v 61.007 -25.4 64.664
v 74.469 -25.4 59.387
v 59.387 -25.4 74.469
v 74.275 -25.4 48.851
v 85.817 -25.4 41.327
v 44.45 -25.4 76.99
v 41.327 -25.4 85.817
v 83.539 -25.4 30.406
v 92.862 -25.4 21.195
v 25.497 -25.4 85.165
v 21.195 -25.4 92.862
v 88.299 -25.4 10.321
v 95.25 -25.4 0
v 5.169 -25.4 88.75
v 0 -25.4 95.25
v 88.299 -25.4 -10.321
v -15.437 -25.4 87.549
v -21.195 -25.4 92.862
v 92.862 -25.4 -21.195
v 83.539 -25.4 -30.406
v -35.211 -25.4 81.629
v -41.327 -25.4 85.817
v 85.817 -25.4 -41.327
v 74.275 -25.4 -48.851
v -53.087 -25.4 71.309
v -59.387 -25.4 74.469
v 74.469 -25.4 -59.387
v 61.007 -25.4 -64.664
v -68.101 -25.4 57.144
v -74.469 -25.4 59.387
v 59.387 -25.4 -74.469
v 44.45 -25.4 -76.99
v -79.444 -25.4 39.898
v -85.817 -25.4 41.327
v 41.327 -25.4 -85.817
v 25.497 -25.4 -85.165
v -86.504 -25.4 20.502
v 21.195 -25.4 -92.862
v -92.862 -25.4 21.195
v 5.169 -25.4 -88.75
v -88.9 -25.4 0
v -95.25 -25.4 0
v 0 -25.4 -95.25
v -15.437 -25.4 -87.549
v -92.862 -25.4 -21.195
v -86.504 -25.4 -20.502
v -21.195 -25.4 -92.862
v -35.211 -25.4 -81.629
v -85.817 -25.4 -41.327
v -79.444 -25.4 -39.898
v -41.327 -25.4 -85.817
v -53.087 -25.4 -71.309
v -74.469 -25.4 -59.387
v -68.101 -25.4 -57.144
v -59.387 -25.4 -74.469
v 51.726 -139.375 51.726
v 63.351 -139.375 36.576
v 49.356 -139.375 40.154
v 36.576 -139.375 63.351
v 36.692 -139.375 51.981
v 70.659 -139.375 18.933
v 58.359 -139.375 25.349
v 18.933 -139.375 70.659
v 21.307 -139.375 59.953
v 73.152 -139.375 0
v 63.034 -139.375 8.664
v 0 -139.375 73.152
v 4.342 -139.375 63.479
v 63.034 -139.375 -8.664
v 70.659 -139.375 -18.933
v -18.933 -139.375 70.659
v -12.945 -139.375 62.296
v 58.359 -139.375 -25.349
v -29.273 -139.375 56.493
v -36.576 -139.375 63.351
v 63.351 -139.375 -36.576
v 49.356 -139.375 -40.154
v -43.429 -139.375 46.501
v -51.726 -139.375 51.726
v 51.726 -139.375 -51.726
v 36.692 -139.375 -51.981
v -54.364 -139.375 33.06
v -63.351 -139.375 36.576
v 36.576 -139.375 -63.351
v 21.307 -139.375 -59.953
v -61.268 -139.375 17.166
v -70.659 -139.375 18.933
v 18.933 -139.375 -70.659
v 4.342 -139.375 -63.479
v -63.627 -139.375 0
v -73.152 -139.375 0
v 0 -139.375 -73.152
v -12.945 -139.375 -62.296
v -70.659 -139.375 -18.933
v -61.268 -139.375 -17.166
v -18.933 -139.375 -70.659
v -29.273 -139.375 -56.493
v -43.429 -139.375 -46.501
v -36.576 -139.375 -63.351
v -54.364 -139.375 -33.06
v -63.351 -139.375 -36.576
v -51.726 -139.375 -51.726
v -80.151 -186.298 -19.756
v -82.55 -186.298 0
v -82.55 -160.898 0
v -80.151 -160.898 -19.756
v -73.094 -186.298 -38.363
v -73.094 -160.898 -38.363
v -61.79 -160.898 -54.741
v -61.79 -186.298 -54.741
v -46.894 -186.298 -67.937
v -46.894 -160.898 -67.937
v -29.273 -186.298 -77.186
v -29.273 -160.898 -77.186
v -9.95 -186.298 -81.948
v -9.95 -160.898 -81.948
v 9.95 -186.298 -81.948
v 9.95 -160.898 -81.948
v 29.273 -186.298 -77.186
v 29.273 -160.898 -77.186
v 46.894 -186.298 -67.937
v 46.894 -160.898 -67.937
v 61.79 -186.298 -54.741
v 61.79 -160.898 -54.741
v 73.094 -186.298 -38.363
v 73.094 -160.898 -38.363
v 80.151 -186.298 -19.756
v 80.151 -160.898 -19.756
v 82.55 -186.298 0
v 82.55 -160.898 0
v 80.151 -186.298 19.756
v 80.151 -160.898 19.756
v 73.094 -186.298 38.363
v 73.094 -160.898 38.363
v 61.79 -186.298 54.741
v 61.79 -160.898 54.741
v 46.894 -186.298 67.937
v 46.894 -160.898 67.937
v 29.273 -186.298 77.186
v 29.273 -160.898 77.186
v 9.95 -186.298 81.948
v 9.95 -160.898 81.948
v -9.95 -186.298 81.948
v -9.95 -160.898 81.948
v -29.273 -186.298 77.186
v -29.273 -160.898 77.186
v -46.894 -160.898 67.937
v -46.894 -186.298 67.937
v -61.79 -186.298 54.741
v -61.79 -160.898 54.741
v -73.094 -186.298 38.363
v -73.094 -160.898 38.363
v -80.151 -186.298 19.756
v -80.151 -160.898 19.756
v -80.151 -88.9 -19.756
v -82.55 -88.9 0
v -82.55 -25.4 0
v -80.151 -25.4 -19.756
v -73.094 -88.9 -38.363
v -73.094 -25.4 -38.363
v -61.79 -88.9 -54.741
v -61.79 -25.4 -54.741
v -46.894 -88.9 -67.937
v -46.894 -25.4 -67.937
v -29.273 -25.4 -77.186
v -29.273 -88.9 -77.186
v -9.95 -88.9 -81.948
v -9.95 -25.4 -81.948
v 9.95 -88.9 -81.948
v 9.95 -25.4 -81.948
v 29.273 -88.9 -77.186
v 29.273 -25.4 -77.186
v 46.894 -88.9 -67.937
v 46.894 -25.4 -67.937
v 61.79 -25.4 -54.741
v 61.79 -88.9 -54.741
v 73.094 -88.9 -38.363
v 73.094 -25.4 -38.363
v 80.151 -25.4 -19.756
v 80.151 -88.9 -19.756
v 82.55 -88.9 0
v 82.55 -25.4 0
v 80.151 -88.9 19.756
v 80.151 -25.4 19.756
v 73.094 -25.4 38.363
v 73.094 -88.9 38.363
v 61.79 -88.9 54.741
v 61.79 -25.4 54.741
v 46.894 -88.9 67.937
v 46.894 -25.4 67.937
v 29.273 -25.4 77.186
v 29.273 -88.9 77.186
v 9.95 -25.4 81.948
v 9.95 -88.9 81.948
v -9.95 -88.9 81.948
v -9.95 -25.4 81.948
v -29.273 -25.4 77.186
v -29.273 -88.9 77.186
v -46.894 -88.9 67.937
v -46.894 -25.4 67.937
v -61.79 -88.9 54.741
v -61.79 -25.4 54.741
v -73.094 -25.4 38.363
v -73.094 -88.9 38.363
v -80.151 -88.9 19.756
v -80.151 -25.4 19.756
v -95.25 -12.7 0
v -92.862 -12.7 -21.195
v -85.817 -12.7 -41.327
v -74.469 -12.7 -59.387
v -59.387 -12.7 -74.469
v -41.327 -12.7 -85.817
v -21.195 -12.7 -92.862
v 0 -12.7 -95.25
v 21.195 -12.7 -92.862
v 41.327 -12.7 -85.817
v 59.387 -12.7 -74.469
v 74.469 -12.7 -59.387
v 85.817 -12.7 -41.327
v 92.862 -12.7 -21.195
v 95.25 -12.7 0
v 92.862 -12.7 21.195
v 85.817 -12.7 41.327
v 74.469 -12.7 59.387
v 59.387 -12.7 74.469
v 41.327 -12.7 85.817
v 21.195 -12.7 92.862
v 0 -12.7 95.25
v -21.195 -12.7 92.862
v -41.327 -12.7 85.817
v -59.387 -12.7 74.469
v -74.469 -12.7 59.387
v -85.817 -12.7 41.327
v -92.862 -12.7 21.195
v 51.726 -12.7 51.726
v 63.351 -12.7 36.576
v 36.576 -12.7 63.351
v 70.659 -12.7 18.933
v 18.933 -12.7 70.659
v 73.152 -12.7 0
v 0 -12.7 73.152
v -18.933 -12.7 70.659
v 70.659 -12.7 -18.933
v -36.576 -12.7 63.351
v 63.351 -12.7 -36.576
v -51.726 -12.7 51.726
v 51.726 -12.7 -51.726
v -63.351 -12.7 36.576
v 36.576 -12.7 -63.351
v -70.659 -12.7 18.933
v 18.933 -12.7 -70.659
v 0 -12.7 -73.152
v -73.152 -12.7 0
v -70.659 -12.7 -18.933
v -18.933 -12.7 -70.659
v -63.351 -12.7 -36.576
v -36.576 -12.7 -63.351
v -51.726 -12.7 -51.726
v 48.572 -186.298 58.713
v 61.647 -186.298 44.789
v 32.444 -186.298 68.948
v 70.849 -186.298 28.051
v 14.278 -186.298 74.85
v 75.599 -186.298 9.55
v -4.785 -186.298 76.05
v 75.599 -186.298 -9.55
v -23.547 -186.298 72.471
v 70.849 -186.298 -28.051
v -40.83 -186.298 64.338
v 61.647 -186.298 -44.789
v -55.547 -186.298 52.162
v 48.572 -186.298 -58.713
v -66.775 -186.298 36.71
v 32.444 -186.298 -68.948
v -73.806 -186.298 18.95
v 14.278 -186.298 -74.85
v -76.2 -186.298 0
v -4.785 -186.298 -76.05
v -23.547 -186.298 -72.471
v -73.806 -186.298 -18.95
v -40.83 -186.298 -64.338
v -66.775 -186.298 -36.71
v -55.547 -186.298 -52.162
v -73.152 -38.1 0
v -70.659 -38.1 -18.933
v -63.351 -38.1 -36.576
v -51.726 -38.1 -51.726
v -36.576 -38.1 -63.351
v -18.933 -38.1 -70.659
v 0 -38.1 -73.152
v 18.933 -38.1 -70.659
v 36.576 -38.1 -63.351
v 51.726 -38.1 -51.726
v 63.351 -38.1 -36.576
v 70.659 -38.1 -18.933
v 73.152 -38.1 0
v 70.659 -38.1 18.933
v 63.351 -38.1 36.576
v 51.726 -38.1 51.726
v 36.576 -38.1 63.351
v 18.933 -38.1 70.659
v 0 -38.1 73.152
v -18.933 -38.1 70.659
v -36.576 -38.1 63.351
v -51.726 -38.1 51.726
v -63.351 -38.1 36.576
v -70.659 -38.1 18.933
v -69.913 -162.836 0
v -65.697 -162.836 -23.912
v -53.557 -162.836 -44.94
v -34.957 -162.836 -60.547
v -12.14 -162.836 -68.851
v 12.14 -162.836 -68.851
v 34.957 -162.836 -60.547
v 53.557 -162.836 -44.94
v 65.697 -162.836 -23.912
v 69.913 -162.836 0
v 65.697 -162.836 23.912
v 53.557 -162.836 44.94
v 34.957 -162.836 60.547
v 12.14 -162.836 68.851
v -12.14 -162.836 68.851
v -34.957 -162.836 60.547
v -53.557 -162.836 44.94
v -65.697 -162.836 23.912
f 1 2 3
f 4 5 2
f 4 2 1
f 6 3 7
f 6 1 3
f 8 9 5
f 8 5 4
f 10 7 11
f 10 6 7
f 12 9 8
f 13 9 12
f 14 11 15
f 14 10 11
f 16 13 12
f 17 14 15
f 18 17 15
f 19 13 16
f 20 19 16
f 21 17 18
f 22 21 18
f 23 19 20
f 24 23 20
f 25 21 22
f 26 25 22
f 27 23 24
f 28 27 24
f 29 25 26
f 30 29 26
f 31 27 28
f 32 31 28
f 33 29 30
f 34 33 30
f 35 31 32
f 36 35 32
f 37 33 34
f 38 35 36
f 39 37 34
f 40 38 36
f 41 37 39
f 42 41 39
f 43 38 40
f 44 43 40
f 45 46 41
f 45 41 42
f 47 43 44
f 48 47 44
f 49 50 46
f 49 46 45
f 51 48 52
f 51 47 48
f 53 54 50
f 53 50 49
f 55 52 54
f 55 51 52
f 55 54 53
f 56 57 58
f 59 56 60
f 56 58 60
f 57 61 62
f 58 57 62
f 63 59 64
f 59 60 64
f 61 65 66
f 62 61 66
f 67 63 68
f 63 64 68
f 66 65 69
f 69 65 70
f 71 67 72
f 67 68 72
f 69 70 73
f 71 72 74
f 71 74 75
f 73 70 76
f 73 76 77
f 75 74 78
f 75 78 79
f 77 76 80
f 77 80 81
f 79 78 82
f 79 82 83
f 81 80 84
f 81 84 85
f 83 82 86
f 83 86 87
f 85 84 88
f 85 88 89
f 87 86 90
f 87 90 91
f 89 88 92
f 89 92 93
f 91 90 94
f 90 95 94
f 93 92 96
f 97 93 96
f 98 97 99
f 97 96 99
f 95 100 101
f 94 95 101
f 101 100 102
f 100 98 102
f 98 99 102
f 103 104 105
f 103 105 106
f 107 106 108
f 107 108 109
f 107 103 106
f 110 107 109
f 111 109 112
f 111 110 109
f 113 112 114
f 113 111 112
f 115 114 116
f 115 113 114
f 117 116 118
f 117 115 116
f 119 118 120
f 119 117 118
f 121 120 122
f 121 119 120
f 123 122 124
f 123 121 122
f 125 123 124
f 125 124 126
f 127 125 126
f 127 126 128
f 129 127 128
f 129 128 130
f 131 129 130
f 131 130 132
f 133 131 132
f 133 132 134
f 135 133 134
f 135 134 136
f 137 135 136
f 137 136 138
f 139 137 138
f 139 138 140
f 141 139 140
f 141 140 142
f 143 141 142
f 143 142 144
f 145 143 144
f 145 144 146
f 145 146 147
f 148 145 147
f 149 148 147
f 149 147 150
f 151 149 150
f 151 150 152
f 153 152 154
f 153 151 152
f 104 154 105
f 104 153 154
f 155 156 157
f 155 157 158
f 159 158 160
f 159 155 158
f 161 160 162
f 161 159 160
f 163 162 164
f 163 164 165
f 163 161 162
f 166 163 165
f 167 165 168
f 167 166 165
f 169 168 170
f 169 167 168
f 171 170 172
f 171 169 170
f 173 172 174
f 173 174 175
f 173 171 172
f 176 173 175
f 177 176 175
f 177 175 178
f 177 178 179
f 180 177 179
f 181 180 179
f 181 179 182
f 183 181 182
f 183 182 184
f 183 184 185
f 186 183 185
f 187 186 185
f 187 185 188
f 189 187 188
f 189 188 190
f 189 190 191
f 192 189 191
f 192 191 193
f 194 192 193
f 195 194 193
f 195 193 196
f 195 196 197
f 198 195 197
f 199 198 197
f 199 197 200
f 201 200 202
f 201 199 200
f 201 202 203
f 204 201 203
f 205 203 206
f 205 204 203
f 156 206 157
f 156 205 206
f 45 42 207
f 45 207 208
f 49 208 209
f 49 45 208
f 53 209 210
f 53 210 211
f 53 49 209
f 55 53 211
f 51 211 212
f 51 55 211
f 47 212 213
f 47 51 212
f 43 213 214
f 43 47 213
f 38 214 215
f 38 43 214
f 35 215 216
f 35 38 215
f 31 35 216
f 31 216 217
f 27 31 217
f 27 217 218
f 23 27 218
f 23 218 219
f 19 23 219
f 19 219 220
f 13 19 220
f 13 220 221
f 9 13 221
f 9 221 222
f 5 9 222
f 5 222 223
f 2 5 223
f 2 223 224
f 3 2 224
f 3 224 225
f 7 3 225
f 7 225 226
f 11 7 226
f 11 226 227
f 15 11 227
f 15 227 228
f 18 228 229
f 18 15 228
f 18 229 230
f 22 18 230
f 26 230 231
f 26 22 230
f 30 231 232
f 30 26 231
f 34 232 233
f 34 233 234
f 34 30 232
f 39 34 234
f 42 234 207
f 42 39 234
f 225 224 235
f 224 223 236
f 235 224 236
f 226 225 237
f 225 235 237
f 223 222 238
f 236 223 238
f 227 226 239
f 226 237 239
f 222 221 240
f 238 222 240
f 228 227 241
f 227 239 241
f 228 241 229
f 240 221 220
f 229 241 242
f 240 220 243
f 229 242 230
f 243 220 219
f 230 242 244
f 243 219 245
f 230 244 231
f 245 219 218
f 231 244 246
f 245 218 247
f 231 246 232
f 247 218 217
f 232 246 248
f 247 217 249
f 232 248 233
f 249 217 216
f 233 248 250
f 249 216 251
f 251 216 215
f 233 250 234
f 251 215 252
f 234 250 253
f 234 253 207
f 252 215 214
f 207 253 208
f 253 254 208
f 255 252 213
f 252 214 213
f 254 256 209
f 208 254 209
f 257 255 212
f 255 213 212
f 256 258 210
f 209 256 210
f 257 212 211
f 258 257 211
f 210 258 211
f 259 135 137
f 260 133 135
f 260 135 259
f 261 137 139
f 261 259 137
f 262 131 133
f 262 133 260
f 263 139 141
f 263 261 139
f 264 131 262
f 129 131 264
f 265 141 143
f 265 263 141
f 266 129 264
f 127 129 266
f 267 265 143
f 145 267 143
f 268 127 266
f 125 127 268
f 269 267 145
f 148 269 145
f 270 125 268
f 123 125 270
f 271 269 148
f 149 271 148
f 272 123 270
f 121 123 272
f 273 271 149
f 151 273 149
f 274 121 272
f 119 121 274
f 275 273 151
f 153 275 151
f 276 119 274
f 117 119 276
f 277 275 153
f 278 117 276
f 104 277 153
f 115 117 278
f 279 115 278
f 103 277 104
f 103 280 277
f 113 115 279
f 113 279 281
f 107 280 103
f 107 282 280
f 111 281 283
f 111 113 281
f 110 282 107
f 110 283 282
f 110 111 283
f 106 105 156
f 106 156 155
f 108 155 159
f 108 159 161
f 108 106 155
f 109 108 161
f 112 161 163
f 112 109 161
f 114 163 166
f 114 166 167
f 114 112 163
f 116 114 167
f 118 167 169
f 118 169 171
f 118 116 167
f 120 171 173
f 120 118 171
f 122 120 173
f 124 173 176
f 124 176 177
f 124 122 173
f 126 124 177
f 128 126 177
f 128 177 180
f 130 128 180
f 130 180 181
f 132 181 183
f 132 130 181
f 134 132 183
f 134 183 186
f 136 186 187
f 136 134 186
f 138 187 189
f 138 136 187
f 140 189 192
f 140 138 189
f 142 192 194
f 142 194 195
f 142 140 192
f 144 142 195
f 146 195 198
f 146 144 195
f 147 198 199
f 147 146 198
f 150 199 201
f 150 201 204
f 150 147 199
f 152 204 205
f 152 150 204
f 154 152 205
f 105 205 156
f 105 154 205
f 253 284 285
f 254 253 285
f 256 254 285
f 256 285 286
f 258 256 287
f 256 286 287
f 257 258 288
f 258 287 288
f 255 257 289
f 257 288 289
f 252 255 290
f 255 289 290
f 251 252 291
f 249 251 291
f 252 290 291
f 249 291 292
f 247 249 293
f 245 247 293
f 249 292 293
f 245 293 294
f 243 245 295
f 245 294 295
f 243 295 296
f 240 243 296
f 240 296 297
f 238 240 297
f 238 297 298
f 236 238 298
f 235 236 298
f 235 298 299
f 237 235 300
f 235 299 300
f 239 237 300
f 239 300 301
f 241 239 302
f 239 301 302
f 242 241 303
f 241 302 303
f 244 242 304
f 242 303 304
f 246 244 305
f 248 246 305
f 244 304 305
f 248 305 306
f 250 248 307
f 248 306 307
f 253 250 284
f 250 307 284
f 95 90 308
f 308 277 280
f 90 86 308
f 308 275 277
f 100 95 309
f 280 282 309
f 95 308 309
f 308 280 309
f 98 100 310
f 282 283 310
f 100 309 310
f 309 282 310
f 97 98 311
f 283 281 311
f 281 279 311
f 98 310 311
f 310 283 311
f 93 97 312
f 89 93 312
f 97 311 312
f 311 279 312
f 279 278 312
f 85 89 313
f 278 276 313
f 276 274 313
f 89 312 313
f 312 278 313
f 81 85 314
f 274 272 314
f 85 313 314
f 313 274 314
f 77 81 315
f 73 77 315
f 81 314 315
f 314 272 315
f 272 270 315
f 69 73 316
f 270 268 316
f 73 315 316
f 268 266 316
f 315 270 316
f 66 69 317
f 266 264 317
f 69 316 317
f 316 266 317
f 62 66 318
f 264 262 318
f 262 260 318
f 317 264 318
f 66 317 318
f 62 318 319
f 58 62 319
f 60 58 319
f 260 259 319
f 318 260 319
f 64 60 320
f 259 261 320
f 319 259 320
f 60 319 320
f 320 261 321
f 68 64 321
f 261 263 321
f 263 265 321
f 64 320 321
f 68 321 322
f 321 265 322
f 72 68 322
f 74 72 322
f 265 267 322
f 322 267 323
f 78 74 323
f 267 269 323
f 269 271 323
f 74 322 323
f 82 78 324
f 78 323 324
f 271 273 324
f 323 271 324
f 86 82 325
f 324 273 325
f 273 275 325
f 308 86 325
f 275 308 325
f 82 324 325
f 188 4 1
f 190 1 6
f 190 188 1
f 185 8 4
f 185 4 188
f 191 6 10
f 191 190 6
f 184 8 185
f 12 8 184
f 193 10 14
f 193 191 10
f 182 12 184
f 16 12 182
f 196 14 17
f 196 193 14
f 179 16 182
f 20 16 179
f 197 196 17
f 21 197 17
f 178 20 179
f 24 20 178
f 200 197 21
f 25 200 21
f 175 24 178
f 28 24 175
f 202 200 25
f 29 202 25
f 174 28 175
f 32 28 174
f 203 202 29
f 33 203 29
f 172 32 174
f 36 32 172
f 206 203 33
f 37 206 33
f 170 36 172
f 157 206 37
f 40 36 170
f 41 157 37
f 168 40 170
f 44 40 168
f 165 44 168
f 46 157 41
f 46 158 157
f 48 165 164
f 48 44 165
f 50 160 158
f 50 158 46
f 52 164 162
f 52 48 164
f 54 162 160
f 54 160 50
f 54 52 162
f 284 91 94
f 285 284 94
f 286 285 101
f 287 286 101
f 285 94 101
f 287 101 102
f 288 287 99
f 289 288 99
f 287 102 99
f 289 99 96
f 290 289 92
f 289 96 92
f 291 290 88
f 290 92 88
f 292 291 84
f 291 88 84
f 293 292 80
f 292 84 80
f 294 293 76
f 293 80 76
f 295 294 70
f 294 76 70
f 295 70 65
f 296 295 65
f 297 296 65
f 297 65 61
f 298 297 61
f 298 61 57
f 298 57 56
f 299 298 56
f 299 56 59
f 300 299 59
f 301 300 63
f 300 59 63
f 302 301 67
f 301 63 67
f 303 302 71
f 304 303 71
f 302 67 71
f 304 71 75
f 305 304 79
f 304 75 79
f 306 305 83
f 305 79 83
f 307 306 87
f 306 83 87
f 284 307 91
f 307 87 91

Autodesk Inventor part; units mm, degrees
ref_plane "YZ Plane" through (0, 0, 0) normal (1, 0, 0) x (0, 1, 0)
ref_plane "XZ Plane" through (0, 0, 0) normal (0, 1, 0) x (-1, 0, 0)
ref_plane "XY Plane" through (0, 0, 0) normal (0, 0, 1) x (1, 0, 0)
sketch "Sketch1" plane through (0, 0, 0) normal (0, 0, 1) x (1, 0, 0)
  line L0 (0, 25.4) -> (-28.702, 25.4) construction
  line L1 (0, 25.4) -> (-95.25, 25.4) construction
  line L2 (-95.25, 25.4) -> (-92.075, 25.4) construction
  line L3 (-92.075, 25.4) -> (-84.455, 21.8467) construction
  line L4 (-92.075, 25.4) -> (-92.075, 22.4389) construction
  line L5 (-92.075, 0) -> (-95.25, 0)
  line L6 (-28.702, 59.0535) -> (-28.702, -92.5226) construction
  arc A0 (-28.9184, -9.8402) -> (-32.3684, -2.4417) centre (-35.052, -8.1967) ccw
  line L7 (-76.2, -186.2977) -> (-28.702, -9.0327)
  line L8 (-92.075, 25.4) -> (-92.075, 0)
  line L9 (-92.075, 25.4) -> (-32.3684, -2.4417)
  line L10 (-28.702, -8.1967) -> (-60.452, -8.1967) construction
  line L11 (-60.452, -127.5253) -> (-54.102, -127.5253) construction
  line L12 (-54.102, -127.5253) -> (-54.102, -103.8268) construction
  line L13 (-54.102, -103.8268) -> (-60.452, -103.8268)
  line L14 (-60.452, 10.654) -> (-60.452, 1.129) construction
  line L15 (-60.452, 10.654) -> (-60.452, 4.1232) construction
  line L16 (-60.452, 4.1232) -> (-46.4468, 4.1232)
  line L17 (-95.25, 0) -> (-95.25, -12.7) construction
  line L18 (-60.452, -12.7) -> (-73.152, -12.7) construction
  line L19 (-95.25, -12.7) -> (-95.25, -25.4) construction
  line L20 (-95.25, -25.4) -> (-95.25, -88.9) construction
  line L21 (-95.25, -88.9) -> (-82.55, -88.9) construction
  line L22 (-82.55, -88.9) -> (-82.55, -25.4) construction
  line L23 (-95.25, -25.4) -> (-82.55, -25.4)
  line L24 (-82.55, -25.4) -> (-82.55, -88.9)
  line L25 (-82.55, -88.9) -> (-95.25, -88.9)
  line L26 (-95.25, -12.7) -> (-73.152, -12.7)
  line L27 (-73.152, -139.3746) -> (-63.627, -139.3746)
  line L28 (-82.55, -88.9) -> (-82.55, -186.2977)
  line L29 (-82.55, -186.2977) -> (-76.2, -186.2977)
  line L30 (-73.152, -12.7) -> (-73.152, -139.3746)
  line L31 (-88.9, -25.4) -> (-88.9, -31.3436)
  line L32 (-88.9, -31.3436) -> (-95.25, -31.3436)
  line L33 (-95.25, 0) -> (-95.25, -25.4)
  line L34 (-95.25, -31.3436) -> (-95.25, -88.9)
  line L35 (-88.9, -160.8977) -> (-88.9, -221.8454)
  line L36 (-28.9184, -9.8402) -> (-85.725, -221.8454)
  line L37 (-85.725, -221.8454) -> (-88.9, -221.8454)
  line L38 (-82.55, -160.8977) -> (-88.9, -160.8977)
  line L39 (-66.802, -38.1) -> (-66.802, 4.1232)
  line L40 (-66.802, 4.1232) -> (-60.452, 4.1232)
  line L41 (-66.802, -38.1) -> (-60.452, -103.8268)
  line L42 (-60.452, 10.654) -> (-60.452, 4.1232) construction
  line L43 (-60.452, -8.1967) -> (-60.452, -12.7) construction
  line L44 (-60.452, -103.8268) -> (-60.452, -127.5253) construction
  line L45 (0, 59.6457) -> (0, -91.9304) construction
  line L46 (-73.152, -38.1) -> (-69.977, -38.1)
  line L47 (-69.977, -38.1) -> (-69.977, -12.7)
  line L48 (-66.802, -12.7) -> (-69.977, -12.7)
  point P0 (0, 0)
  point P1 (-95.25, -256.5049)
  point P2 (-88.7095, 22.4389)
  dimension "d0" = 28.702
  dimension "d1" = 95.25
  dimension "d2" = 3.175
  dimension "d3" = 25
  dimension "d5" = 25.4
  dimension "d6" = 25.4
  dimension "d8" = 12.7
  dimension "d12" = 31.75
  dimension "d13" = 6.35
  dimension "d16" = 12.7
  dimension "d17" = 12.7
  dimension "d18" = 12.7
  dimension "d19" = 63.5
  dimension "d20" = 12.7
  dimension "d22" = 9.525
  dimension "d23" = 6.35
  dimension "d25" = 5.9436
  dimension "d27" = 3.175
  dimension "d28" = 6.35
  dimension "d29" = 25.4
  dimension "d30" = 107.95
  dimension "d31" = 6.35
  dimension "d33" = 20.3552
  dimension "d34" = 15
  dimension "d35" = 3.175
  dimension "d36" = 25.4
revolve "Revolution1" add sketch "Sketch1" angle 360 about axis through (0, 59.6457, 0) along (0, -1, 0) contours L26 L30 L27 L7 L29 L28 L24 L23 L33
properties part number "aluminum_casing" material "Aluminum 6061"
